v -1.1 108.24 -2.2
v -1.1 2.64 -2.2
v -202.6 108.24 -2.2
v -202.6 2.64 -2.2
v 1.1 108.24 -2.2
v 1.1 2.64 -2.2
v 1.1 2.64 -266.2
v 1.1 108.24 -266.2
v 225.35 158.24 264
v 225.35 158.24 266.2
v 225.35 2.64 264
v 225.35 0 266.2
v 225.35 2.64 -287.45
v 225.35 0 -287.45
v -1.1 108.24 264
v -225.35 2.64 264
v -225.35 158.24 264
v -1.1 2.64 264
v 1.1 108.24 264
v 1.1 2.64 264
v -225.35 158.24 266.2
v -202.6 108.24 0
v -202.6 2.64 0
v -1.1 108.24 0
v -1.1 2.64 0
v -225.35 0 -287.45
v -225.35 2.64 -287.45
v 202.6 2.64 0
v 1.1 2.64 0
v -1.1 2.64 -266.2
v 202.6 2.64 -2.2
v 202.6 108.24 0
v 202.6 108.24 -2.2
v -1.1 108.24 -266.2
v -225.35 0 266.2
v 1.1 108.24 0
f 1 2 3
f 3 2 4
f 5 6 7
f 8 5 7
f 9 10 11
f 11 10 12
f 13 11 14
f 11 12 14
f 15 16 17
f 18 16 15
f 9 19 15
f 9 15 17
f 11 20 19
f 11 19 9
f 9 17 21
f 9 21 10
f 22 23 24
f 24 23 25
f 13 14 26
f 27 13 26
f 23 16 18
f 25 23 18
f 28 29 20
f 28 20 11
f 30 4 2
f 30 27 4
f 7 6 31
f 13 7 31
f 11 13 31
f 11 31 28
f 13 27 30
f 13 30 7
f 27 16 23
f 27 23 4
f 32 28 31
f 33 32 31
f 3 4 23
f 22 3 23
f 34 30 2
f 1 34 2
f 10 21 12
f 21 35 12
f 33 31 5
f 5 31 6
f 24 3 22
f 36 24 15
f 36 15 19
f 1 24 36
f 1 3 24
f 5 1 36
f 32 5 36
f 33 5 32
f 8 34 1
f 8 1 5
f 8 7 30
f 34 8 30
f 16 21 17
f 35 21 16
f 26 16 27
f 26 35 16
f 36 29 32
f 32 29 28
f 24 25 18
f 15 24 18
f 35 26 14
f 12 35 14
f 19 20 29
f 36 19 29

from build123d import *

# Parameters (mm, degrees)
BOSS_EXTRUDE1_DEPTH = 2.64
SKETCH2_W           = 450.7
SKETCH2_H           = 2.2
BOSS_EXTRUDE2_DEPTH = 155.6
BOSS_EXTRUDE3_DEPTH = 105.6


with BuildPart() as part:
    # Sketch1 → Boss-Extrude1 (new body)
    with BuildSketch(Plane(origin=(0, 0, 0), x_dir=(1, 0, 0), z_dir=(0, 1, 0))):
        Polygon((-225.35, 287.45), (-225.35, -266.2), (-204.1, -266.2), (204.1, -266.2), (225.35, -266.2), (225.35, 287.45), align=None)
    extrude(amount=BOSS_EXTRUDE1_DEPTH)

    # Sketch2 → Boss-Extrude2 (add)
    with BuildSketch(Plane(origin=(0, 2.64, 0), x_dir=(1, 0, 0), z_dir=(0, 1, 0))):
        with Locations((0, -265.1)):
            Rectangle(SKETCH2_W, SKETCH2_H)
    extrude(amount=BOSS_EXTRUDE2_DEPTH)

    # Sketch3 → Boss-Extrude3 (add)
    with BuildSketch(Plane(origin=(0, 2.64, 0), x_dir=(1, 0, 0), z_dir=(0, 1, 0))):
        Polygon((1.1, -264), (1.1, 0), (202.6, 0), (202.6, 2.2), (1.1, 2.2), (1.1, 266.2), (-1.1, 266.2), (-1.1, 2.2), (-202.6, 2.2), (-202.6, 0), (-1.1, 0), (-1.1, -264), align=None)
    extrude(amount=BOSS_EXTRUDE3_DEPTH)


solid = part.part
